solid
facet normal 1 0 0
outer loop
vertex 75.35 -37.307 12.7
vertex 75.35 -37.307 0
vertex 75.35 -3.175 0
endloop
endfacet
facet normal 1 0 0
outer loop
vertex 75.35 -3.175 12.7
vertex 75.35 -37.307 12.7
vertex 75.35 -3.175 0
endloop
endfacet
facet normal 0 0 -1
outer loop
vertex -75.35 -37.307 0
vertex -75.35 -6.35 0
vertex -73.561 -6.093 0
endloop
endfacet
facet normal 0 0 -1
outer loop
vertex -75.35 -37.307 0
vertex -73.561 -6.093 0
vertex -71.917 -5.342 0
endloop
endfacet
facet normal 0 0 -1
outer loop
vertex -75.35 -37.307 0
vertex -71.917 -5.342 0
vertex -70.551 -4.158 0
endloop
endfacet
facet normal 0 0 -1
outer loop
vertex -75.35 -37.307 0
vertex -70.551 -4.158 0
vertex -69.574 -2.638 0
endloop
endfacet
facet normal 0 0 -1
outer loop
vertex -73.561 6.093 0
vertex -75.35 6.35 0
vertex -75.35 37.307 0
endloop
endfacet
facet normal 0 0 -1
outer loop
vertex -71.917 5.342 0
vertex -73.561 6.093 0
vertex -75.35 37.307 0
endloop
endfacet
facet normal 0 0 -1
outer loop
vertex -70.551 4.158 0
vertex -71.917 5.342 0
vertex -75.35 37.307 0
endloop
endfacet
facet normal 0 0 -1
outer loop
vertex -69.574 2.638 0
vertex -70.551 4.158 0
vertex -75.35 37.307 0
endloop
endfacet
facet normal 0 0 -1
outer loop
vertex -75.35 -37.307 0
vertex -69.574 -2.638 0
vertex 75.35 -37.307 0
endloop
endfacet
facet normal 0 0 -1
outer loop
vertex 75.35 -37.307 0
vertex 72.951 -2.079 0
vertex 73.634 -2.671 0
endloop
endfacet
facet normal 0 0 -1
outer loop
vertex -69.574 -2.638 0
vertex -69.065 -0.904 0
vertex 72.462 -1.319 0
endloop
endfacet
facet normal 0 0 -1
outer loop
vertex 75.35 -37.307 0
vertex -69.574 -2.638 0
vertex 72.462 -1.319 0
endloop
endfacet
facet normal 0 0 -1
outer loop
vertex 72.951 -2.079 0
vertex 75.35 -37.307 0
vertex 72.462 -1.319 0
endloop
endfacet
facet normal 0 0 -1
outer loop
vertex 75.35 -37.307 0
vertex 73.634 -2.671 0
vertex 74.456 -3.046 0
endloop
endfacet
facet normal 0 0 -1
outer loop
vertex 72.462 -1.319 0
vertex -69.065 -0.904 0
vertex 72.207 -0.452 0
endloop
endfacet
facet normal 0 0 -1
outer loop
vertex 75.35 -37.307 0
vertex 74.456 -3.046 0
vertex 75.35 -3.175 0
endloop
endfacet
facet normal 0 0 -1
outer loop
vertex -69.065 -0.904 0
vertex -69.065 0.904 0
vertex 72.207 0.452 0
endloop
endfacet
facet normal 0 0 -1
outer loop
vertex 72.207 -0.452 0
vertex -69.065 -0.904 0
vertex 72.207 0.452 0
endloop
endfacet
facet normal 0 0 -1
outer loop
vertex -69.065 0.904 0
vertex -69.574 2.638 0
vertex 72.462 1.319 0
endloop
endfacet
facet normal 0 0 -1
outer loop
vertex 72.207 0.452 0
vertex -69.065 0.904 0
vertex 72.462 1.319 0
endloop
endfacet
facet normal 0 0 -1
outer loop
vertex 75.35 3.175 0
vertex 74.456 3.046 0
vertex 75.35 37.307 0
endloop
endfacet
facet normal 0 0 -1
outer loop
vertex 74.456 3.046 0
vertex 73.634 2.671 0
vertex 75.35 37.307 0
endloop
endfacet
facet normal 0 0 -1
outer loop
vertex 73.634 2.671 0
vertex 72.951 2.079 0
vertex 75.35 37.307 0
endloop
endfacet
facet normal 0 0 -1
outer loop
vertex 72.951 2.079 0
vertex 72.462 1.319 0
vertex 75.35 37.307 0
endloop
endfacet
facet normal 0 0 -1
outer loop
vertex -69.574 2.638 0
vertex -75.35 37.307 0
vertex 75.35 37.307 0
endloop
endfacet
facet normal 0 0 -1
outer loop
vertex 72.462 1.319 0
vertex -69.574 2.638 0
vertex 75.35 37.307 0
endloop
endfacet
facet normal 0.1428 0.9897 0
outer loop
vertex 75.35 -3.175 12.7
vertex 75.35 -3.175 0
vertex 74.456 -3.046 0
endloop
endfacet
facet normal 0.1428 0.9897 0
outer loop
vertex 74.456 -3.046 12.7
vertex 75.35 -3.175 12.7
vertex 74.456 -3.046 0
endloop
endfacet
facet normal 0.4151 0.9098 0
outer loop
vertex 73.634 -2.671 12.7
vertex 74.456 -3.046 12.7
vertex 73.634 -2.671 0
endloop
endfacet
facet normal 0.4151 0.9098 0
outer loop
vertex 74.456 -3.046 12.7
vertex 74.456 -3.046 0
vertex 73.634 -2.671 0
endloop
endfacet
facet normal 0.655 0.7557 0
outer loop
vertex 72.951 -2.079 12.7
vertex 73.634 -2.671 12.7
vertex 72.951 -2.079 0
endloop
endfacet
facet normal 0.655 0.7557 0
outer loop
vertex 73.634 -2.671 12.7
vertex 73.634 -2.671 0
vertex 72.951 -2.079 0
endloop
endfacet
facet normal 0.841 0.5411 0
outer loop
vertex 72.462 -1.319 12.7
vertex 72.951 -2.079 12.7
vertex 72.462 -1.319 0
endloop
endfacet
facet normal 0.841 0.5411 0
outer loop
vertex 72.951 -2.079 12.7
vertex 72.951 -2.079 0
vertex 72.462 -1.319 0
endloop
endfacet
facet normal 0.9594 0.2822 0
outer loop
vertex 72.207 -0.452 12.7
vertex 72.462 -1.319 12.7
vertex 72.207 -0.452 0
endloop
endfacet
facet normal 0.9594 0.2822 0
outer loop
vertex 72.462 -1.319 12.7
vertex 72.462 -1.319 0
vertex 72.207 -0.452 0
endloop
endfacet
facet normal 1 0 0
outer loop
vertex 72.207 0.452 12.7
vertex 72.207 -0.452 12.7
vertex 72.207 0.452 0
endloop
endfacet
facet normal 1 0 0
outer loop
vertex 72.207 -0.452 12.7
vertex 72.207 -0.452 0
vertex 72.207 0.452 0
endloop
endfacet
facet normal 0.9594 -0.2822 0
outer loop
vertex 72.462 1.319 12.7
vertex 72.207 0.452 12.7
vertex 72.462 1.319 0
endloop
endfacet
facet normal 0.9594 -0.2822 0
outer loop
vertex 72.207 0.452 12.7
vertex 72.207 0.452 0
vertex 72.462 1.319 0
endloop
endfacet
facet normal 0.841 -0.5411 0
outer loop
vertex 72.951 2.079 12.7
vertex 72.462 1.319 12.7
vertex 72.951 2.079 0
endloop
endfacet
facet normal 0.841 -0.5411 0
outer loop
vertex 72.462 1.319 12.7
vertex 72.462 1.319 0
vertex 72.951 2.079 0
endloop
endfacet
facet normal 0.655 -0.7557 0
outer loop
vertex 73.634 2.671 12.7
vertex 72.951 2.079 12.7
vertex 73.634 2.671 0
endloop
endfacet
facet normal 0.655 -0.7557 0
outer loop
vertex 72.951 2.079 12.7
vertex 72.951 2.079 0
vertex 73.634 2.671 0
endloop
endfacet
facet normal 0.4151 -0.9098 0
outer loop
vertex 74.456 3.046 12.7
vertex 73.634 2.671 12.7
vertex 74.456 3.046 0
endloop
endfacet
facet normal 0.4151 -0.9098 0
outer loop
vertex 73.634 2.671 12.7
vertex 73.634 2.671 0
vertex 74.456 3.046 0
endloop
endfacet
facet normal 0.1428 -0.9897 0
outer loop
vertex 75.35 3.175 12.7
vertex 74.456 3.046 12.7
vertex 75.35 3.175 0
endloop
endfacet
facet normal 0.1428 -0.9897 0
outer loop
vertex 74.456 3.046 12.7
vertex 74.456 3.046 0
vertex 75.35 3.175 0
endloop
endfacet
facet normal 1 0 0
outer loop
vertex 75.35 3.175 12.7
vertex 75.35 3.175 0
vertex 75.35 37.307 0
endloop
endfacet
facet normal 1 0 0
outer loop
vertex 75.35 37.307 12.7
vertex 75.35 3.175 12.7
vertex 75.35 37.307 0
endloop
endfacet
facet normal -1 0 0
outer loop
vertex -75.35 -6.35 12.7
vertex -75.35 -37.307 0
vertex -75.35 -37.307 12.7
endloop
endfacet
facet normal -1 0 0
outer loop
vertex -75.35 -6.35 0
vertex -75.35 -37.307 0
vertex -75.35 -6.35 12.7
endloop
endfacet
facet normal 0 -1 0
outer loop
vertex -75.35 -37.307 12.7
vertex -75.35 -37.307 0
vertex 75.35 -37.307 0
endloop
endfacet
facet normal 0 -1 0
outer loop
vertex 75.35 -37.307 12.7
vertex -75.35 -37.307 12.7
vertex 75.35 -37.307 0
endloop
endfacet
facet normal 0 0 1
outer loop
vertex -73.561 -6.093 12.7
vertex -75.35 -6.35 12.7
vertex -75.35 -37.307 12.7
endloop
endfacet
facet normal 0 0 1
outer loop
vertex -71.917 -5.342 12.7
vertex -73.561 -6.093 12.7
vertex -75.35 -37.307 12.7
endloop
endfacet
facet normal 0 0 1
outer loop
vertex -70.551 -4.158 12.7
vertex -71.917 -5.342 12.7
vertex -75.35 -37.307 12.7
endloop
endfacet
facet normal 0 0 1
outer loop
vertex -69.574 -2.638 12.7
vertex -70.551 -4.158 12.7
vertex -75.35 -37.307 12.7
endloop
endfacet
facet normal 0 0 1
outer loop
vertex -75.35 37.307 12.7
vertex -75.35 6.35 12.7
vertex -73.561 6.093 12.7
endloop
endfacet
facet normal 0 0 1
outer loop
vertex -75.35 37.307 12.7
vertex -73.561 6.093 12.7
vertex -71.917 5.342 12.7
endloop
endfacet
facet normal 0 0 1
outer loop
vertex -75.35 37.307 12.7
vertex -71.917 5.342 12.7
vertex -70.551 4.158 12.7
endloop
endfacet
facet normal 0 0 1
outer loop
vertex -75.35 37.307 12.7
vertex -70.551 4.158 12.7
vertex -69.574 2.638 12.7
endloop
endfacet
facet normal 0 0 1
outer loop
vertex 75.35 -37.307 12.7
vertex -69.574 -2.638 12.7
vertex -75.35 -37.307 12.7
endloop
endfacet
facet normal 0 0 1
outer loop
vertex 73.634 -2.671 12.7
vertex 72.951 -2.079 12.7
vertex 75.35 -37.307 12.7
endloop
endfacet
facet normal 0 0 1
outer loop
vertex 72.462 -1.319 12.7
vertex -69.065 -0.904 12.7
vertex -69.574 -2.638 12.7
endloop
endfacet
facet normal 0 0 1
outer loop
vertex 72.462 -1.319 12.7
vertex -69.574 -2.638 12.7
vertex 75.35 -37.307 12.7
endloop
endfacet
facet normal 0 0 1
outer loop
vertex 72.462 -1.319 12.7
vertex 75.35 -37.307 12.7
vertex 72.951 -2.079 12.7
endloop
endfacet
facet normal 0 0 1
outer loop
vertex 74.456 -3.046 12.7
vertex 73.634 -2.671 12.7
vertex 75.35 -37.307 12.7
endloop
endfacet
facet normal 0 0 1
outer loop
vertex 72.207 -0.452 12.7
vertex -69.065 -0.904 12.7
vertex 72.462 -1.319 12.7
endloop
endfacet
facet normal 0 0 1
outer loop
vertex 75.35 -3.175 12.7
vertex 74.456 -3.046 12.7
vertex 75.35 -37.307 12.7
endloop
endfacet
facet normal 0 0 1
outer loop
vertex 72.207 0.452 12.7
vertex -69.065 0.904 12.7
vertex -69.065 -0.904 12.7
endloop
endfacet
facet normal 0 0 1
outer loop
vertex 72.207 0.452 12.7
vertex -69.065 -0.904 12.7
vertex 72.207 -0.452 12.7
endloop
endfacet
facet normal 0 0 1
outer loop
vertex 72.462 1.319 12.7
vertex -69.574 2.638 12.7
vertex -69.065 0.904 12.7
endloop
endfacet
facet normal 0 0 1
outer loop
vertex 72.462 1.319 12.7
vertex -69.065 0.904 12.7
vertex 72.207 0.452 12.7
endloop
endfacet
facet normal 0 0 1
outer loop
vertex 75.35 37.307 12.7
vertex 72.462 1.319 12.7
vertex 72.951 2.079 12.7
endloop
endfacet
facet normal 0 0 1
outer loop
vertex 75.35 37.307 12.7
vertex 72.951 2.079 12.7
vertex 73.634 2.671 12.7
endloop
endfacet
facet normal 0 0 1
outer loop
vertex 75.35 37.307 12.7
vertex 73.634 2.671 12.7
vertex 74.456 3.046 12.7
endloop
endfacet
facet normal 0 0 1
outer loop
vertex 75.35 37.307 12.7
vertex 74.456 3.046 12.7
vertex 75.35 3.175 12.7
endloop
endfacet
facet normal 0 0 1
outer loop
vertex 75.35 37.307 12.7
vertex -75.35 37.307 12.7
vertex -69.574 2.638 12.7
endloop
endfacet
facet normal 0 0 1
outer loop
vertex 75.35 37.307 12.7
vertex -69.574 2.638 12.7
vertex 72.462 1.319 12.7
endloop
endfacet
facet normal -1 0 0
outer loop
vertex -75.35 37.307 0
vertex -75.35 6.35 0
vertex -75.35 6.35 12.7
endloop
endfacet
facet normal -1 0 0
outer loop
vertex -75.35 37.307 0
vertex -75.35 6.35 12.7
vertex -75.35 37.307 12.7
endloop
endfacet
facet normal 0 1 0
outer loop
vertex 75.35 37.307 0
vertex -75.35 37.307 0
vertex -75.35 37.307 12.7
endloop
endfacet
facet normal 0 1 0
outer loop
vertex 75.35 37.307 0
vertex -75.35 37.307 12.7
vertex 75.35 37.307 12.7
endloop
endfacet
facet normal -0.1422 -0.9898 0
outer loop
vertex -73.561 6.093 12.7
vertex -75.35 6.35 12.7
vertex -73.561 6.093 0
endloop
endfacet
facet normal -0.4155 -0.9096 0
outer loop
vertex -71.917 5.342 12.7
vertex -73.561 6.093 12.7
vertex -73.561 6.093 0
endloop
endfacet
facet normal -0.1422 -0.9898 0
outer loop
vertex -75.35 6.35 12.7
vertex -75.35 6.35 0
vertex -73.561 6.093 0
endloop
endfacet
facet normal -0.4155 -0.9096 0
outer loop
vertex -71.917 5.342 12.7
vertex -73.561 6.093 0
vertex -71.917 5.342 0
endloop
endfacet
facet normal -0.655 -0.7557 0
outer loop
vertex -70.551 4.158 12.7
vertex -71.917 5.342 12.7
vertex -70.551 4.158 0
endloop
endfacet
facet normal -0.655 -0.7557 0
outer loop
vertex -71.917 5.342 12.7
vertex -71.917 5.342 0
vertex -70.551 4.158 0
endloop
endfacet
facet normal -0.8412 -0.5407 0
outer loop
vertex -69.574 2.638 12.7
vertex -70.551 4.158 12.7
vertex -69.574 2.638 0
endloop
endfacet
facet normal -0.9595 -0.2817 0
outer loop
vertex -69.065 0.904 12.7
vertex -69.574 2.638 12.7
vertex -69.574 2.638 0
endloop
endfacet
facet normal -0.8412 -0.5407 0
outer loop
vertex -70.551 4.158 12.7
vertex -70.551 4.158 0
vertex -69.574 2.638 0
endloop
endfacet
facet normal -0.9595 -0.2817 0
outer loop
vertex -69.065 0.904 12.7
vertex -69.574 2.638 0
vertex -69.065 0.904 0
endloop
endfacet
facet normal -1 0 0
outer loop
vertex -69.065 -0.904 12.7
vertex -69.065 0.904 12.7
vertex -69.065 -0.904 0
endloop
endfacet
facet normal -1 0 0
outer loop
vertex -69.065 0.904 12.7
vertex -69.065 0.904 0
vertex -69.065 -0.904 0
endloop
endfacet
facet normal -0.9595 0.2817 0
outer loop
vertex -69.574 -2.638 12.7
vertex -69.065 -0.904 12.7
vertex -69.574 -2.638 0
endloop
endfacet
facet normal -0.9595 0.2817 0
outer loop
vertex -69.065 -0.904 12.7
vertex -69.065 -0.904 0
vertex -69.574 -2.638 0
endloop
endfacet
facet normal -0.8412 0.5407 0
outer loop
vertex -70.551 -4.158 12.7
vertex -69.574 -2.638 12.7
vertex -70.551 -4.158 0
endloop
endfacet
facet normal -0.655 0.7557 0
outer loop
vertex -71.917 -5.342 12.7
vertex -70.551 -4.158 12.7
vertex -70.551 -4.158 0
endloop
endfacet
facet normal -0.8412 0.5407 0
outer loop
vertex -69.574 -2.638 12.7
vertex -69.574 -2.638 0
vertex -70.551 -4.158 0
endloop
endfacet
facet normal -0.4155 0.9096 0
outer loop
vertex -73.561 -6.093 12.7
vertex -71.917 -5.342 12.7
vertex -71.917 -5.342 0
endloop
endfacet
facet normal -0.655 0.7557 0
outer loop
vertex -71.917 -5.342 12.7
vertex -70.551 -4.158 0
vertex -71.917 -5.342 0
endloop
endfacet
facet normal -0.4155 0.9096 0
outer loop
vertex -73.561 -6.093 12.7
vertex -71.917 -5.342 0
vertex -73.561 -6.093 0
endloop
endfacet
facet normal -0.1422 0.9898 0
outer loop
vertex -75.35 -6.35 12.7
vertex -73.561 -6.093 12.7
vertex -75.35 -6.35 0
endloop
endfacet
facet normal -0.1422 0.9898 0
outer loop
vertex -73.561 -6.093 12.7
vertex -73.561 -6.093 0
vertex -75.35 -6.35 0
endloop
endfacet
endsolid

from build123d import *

# Parameters (mm, degrees)
F0_W     = 150.700152
F0_H     = 74.61378
F1_DEPTH = 12.7
F3_D     = 6.35
F5_D     = 12.7


with BuildPart() as f1:
    # F0 (on Top) → F1 (new body)
    with BuildSketch(Plane.XY):
        Rectangle(F0_W, F0_H)
    extrude(amount=F1_DEPTH)

    # F3 (through all)
    with Locations(Plane.XY.offset(12.7)):
        with Locations((75.350076, 0)):
            Hole(F3_D / 2)

    # F5 (through all)
    with Locations(Plane.XY.offset(12.7)):
        with Locations((-75.350076, 0)):
            Hole(F5_D / 2)


solid = f1.part
